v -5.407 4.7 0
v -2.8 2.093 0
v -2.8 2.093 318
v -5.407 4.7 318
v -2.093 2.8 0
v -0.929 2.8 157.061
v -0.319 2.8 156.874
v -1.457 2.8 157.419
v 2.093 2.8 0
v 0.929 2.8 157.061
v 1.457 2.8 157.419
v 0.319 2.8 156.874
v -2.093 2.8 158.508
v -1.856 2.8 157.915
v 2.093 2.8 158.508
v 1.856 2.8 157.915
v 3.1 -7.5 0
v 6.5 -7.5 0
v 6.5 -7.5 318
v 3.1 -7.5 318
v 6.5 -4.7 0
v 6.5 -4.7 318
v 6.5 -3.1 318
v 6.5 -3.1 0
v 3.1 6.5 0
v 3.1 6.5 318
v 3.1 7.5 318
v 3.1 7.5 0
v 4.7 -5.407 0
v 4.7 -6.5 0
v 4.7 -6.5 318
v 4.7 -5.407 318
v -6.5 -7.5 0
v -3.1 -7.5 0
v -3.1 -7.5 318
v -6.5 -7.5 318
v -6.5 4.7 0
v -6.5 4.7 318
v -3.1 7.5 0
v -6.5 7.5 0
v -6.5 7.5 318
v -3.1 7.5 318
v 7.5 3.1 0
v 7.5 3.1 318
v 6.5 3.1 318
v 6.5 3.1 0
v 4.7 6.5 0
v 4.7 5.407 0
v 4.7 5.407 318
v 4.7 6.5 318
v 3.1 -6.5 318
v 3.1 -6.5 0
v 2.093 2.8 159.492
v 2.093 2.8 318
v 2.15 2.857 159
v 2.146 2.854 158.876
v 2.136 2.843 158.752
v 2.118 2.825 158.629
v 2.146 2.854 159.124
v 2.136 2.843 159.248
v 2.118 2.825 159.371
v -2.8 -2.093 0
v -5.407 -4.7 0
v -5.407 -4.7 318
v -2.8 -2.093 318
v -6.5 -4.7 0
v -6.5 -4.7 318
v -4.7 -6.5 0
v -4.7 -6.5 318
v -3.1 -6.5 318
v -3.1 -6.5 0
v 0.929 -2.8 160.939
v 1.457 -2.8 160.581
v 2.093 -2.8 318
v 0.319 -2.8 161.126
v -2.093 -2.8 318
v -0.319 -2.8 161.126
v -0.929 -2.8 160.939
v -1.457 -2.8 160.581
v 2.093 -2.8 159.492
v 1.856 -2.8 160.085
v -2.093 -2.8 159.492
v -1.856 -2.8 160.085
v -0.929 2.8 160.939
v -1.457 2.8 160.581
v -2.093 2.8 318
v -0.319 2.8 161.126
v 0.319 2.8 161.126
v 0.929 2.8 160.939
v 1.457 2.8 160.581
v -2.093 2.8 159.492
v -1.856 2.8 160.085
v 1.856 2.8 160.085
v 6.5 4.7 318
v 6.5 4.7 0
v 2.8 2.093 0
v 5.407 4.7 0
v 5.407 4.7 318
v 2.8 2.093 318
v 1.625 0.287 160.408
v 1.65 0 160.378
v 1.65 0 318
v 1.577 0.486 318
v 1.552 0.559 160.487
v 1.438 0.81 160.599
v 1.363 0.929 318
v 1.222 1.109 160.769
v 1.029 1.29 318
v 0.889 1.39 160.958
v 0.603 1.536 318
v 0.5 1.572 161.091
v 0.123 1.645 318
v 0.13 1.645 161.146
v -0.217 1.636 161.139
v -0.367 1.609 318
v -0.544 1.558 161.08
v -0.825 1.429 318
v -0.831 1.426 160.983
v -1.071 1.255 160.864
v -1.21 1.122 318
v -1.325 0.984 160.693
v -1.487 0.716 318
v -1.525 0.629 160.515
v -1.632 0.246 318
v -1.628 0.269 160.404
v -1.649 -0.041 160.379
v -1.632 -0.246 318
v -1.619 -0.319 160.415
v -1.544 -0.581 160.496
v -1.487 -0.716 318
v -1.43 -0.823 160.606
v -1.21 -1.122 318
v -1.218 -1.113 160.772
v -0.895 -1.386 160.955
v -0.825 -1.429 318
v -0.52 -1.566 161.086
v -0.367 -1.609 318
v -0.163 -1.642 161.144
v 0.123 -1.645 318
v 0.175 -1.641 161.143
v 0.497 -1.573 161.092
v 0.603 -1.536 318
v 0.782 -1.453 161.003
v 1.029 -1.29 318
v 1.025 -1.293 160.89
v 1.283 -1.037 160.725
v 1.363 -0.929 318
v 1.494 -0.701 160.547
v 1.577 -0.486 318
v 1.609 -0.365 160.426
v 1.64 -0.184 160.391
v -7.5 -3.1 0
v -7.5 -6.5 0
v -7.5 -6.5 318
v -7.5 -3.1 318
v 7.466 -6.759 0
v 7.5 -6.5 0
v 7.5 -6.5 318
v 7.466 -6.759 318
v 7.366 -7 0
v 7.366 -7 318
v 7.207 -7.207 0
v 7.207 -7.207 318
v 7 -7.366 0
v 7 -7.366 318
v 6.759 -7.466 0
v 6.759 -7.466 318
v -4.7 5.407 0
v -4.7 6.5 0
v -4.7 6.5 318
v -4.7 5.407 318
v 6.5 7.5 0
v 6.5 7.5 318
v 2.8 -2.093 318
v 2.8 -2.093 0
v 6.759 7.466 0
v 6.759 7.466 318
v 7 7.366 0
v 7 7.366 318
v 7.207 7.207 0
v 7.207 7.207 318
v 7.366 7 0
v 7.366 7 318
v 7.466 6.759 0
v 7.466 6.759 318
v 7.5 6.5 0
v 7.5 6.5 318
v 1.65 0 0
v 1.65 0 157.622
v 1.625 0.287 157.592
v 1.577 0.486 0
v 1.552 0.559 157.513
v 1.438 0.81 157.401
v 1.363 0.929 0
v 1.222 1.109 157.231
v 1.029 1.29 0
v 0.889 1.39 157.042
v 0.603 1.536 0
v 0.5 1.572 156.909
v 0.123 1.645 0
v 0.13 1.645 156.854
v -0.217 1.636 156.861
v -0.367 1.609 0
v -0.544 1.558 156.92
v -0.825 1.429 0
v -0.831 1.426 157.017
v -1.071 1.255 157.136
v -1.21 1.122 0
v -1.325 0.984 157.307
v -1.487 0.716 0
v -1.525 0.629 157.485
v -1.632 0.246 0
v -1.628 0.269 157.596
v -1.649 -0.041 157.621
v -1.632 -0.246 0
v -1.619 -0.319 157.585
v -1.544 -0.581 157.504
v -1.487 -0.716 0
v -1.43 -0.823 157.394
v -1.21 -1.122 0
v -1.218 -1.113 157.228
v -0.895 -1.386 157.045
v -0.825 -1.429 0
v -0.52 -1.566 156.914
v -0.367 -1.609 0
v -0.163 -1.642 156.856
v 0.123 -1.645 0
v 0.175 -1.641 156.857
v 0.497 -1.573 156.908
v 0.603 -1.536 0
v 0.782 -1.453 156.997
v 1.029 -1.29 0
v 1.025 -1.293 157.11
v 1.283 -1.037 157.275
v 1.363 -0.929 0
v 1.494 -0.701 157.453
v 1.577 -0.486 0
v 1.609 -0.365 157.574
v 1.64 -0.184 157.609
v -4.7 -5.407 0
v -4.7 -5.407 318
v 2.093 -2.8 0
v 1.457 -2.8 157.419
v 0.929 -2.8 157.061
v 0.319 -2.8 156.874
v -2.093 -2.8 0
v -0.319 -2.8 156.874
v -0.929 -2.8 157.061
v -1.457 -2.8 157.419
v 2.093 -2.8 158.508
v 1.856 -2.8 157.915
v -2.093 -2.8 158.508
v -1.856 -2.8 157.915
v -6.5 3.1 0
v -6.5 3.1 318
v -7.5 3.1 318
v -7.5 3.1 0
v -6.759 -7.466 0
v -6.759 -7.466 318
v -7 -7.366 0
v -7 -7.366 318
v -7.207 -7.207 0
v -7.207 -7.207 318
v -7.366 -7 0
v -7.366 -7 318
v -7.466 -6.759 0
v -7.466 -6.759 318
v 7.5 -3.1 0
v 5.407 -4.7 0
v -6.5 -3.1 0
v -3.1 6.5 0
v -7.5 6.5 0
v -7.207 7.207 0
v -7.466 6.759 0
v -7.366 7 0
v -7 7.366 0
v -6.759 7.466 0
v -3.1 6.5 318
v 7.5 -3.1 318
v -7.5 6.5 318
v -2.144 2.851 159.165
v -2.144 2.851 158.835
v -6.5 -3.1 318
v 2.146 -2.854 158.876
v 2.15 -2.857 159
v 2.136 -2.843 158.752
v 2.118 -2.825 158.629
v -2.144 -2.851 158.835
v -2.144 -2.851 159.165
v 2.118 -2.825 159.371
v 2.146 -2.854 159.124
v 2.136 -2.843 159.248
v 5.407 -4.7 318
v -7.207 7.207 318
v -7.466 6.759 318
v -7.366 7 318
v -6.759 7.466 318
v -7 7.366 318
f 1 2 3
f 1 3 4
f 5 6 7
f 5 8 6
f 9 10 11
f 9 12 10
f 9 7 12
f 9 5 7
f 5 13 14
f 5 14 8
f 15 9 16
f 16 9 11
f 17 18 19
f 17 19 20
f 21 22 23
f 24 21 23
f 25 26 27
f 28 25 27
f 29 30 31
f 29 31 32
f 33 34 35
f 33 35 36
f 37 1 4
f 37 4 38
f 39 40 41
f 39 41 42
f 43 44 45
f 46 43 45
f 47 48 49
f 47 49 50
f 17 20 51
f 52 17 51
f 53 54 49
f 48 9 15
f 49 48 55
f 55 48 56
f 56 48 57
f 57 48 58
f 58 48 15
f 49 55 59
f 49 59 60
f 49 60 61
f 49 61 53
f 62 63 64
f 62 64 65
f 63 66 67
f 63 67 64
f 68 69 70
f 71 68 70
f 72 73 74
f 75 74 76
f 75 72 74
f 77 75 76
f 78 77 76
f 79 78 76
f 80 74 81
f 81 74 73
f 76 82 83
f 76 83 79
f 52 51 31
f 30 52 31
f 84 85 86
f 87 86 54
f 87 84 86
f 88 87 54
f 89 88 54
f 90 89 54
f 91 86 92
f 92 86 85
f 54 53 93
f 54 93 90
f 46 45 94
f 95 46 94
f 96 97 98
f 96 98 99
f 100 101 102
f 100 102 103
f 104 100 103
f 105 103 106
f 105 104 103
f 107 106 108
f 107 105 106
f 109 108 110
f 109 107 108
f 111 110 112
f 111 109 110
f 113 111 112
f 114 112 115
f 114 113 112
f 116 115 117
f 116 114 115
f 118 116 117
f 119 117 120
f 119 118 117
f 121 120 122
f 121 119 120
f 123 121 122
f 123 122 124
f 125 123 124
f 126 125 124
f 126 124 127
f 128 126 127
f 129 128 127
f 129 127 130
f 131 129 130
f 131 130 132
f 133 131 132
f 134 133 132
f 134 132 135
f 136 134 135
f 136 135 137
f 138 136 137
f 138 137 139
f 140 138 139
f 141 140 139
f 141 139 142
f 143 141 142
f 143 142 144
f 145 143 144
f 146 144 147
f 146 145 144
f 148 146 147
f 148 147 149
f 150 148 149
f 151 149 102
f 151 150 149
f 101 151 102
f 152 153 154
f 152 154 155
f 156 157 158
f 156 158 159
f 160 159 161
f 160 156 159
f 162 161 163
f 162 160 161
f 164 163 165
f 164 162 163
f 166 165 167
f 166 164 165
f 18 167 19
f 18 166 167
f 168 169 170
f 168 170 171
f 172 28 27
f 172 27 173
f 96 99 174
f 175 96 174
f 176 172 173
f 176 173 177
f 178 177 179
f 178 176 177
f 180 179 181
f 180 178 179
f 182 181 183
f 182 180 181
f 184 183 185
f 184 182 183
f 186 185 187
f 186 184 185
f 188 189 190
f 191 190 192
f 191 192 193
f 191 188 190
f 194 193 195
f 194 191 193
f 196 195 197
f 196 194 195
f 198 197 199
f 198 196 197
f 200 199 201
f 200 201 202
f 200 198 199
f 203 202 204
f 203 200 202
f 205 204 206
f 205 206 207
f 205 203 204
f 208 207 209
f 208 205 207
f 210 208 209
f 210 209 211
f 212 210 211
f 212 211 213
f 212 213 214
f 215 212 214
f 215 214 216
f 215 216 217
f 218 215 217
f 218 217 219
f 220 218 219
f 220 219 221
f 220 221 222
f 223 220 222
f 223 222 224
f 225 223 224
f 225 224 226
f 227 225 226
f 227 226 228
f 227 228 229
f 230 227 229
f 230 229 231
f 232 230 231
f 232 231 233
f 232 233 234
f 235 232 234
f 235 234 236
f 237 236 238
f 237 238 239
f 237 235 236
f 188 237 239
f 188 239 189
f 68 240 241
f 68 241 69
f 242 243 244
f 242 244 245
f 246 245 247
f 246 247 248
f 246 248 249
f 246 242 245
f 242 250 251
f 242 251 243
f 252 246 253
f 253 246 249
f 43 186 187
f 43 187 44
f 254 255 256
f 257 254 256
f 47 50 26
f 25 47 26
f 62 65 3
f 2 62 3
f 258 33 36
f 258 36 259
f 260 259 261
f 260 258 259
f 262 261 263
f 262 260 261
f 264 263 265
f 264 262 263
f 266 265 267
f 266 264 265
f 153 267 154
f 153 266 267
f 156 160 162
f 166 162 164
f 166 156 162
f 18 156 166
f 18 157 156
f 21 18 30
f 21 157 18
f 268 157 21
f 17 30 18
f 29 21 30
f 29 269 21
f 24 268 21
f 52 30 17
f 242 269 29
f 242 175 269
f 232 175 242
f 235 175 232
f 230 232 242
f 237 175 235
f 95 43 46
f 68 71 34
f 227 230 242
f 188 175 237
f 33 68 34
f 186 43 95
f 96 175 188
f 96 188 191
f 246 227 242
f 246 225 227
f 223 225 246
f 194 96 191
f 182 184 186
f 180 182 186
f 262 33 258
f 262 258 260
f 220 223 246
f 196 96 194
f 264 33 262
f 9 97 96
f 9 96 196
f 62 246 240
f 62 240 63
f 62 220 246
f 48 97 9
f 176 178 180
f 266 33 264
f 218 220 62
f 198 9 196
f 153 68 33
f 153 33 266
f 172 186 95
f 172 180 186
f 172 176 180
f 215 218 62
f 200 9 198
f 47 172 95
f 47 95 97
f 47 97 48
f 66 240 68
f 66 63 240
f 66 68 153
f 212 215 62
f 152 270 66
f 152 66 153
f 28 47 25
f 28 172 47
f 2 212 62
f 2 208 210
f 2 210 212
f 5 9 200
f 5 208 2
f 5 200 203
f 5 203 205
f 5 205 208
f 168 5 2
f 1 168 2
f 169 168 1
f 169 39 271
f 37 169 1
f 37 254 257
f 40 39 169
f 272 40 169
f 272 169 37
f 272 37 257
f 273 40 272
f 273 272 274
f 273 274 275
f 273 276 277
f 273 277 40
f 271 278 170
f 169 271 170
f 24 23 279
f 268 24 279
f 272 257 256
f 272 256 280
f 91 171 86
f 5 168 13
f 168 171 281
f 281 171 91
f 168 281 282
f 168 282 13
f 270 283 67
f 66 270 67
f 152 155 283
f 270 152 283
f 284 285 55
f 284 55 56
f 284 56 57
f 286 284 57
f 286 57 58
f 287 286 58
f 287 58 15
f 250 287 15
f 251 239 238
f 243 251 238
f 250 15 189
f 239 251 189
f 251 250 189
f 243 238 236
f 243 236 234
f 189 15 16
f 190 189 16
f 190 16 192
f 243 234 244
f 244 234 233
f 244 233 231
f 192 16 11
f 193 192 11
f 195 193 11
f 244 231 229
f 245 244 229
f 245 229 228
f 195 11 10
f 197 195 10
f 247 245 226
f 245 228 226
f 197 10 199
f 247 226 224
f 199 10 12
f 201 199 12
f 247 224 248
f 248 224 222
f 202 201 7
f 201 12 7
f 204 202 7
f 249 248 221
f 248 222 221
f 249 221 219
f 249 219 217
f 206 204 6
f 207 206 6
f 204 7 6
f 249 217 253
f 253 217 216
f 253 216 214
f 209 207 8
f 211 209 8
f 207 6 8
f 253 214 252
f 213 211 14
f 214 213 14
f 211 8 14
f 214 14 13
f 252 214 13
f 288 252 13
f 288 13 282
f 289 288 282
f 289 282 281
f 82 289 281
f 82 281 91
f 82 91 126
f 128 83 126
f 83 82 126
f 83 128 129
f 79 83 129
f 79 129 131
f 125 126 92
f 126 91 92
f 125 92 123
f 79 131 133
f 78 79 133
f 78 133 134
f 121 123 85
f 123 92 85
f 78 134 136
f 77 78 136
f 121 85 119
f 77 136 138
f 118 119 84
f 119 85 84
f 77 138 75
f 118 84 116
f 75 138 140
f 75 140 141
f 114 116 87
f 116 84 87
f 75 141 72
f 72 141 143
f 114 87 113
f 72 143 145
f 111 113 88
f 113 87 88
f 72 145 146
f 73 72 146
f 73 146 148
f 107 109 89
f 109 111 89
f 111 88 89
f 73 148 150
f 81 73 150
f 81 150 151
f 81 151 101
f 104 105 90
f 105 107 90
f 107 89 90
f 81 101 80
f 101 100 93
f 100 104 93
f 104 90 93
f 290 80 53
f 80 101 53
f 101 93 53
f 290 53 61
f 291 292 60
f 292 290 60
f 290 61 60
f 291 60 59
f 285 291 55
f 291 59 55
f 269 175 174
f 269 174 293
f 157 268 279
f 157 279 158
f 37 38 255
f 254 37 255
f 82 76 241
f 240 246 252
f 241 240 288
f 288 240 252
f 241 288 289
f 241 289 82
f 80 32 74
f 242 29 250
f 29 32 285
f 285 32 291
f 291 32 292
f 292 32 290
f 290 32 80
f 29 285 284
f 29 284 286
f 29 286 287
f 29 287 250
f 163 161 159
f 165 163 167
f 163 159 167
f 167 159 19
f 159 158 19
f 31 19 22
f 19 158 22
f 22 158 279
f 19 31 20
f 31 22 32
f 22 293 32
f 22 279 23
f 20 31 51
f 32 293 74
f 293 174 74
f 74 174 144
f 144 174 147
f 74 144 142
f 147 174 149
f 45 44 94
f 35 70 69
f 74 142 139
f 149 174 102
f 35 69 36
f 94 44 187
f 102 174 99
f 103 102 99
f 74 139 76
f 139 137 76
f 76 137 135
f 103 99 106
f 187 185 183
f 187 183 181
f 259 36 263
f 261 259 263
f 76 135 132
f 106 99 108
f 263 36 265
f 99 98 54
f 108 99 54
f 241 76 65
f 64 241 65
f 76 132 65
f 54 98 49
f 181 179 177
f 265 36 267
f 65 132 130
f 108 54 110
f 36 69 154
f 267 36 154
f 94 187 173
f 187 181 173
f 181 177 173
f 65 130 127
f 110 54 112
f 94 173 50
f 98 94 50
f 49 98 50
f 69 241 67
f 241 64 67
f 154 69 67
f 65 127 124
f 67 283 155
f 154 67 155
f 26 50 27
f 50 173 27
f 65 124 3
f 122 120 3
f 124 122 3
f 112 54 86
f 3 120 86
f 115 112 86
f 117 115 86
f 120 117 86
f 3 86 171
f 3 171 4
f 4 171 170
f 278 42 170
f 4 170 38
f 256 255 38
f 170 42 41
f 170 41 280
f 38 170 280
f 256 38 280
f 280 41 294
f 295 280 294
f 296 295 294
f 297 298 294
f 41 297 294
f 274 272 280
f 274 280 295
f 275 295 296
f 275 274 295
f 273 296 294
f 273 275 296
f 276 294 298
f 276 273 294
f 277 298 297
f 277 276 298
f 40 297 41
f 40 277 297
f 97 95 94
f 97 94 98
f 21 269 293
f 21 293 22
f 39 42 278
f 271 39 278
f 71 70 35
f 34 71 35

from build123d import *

# Parameters (mm, degrees)
SKETCH_1_R          = 1.65
EXTRUDE_1_DEPTH     = 318
SKETCH_12_R         = 2.15
CUT_EXTRUDE_3_DEPTH = 25


with BuildPart() as part:
    # 草图1 → 凸台-拉伸1 (new body)
    with BuildSketch(Plane.XY):
        with BuildLine():
            Line((-2.092893219, 2.8), (2.092893219, 2.8))
            Line((2.092893219, 2.8), (4.7, 5.407106781))
            Line((4.7, 5.407106781), (4.7, 6.5))
            Line((4.7, 6.5), (3.1, 6.5))
            Line((3.1, 6.5), (3.1, 7.5))
            Line((3.1, 7.5), (6.5, 7.5))
            ThreePointArc((6.5, 7.5), (7.207106781, 7.207106781), (7.5, 6.5))
            Line((7.5, 6.5), (7.5, 3.1))
            Line((7.5, 3.1), (6.5, 3.1))
            Line((6.5, 3.1), (6.5, 4.7))
            Line((6.5, 4.7), (5.407106781, 4.7))
            Line((5.407106781, 4.7), (2.8, 2.092893219))
            Line((2.8, 2.092893219), (2.8, -2.092893219))
            Line((2.8, -2.092893219), (5.407106781, -4.7))
            Line((5.407106781, -4.7), (6.5, -4.7))
            Line((6.5, -4.7), (6.5, -3.1))
            Line((6.5, -3.1), (7.5, -3.1))
            Line((7.5, -3.1), (7.5, -6.5))
            ThreePointArc((7.5, -6.5), (7.207106781, -7.207106781), (6.5, -7.5))
            Line((6.5, -7.5), (3.1, -7.5))
            Line((3.1, -7.5), (3.1, -6.5))
            Line((3.1, -6.5), (4.7, -6.5))
            Line((4.7, -6.5), (4.7, -5.407106781))
            Line((4.7, -5.407106781), (2.092893219, -2.8))
            Line((2.092893219, -2.8), (-2.092893219, -2.8))
            Line((-2.092893219, -2.8), (-4.7, -5.407106781))
            Line((-4.7, -5.407106781), (-4.7, -6.5))
            Line((-4.7, -6.5), (-3.1, -6.5))
            Line((-3.1, -6.5), (-3.1, -7.5))
            Line((-3.1, -7.5), (-6.5, -7.5))
            ThreePointArc((-6.5, -7.5), (-7.207106781, -7.207106781), (-7.5, -6.5))
            Line((-7.5, -6.5), (-7.5, -3.1))
            Line((-7.5, -3.1), (-6.5, -3.1))
            Line((-6.5, -3.1), (-6.5, -4.7))
            Line((-6.5, -4.7), (-5.407106781, -4.7))
            Line((-5.407106781, -4.7), (-2.8, -2.092893219))
            Line((-2.8, -2.092893219), (-2.8, 2.092893219))
            Line((-2.8, 2.092893219), (-5.407106781, 4.7))
            Line((-5.407106781, 4.7), (-6.5, 4.7))
            Line((-6.5, 4.7), (-6.5, 3.1))
            Line((-6.5, 3.1), (-7.5, 3.1))
            Line((-7.5, 3.1), (-7.5, 6.5))
            ThreePointArc((-7.5, 6.5), (-7.207106781, 7.207106781), (-6.5, 7.5))
            Line((-6.5, 7.5), (-3.1, 7.5))
            Line((-3.1, 7.5), (-3.1, 6.5))
            Line((-3.1, 6.5), (-4.7, 6.5))
            Line((-4.7, 6.5), (-4.7, 5.407106781))
            Line((-4.7, 5.407106781), (-2.092893219, 2.8))
        make_face()
        Circle(SKETCH_1_R, mode=Mode.SUBTRACT)
    extrude(amount=EXTRUDE_1_DEPTH)

    # 草图12 → 切除-拉伸3 (cut, symmetric)
    with BuildSketch(Plane(origin=(0, 0, 0), x_dir=(1, 0, 0), z_dir=(0, 1, 0))):
        with Locations((0, -159)):
            Circle(SKETCH_12_R)
    extrude(amount=CUT_EXTRUDE_3_DEPTH, both=True, mode=Mode.SUBTRACT)


solid = part.part
